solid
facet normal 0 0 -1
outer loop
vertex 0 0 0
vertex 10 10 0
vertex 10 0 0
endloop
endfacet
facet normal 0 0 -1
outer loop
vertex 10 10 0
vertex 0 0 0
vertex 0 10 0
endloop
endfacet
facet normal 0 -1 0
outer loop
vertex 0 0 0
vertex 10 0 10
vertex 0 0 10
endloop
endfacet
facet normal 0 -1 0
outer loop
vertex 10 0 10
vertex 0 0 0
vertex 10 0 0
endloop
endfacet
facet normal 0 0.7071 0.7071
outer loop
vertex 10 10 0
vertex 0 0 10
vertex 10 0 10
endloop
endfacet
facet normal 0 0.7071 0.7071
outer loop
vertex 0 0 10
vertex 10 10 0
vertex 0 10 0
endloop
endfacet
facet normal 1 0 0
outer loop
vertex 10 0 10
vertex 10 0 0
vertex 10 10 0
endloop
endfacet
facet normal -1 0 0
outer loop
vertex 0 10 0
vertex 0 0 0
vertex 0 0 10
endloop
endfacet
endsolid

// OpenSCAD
module triangle(l, w, h){
      polyhedron(//pt 0        1        2        3        4        5
              points=[[0,0,0], [l,0,0], [l,w,0], [0,w,0], [0,w,h], [l,w,h]],
              faces=[[0,1,2,3],[5,4,3,2],[0,4,5,1],[0,3,4],[5,2,1]]
              );
            }
  
translate([10,10,0]) rotate([0,0,180])  triangle(10, 10, 10);
